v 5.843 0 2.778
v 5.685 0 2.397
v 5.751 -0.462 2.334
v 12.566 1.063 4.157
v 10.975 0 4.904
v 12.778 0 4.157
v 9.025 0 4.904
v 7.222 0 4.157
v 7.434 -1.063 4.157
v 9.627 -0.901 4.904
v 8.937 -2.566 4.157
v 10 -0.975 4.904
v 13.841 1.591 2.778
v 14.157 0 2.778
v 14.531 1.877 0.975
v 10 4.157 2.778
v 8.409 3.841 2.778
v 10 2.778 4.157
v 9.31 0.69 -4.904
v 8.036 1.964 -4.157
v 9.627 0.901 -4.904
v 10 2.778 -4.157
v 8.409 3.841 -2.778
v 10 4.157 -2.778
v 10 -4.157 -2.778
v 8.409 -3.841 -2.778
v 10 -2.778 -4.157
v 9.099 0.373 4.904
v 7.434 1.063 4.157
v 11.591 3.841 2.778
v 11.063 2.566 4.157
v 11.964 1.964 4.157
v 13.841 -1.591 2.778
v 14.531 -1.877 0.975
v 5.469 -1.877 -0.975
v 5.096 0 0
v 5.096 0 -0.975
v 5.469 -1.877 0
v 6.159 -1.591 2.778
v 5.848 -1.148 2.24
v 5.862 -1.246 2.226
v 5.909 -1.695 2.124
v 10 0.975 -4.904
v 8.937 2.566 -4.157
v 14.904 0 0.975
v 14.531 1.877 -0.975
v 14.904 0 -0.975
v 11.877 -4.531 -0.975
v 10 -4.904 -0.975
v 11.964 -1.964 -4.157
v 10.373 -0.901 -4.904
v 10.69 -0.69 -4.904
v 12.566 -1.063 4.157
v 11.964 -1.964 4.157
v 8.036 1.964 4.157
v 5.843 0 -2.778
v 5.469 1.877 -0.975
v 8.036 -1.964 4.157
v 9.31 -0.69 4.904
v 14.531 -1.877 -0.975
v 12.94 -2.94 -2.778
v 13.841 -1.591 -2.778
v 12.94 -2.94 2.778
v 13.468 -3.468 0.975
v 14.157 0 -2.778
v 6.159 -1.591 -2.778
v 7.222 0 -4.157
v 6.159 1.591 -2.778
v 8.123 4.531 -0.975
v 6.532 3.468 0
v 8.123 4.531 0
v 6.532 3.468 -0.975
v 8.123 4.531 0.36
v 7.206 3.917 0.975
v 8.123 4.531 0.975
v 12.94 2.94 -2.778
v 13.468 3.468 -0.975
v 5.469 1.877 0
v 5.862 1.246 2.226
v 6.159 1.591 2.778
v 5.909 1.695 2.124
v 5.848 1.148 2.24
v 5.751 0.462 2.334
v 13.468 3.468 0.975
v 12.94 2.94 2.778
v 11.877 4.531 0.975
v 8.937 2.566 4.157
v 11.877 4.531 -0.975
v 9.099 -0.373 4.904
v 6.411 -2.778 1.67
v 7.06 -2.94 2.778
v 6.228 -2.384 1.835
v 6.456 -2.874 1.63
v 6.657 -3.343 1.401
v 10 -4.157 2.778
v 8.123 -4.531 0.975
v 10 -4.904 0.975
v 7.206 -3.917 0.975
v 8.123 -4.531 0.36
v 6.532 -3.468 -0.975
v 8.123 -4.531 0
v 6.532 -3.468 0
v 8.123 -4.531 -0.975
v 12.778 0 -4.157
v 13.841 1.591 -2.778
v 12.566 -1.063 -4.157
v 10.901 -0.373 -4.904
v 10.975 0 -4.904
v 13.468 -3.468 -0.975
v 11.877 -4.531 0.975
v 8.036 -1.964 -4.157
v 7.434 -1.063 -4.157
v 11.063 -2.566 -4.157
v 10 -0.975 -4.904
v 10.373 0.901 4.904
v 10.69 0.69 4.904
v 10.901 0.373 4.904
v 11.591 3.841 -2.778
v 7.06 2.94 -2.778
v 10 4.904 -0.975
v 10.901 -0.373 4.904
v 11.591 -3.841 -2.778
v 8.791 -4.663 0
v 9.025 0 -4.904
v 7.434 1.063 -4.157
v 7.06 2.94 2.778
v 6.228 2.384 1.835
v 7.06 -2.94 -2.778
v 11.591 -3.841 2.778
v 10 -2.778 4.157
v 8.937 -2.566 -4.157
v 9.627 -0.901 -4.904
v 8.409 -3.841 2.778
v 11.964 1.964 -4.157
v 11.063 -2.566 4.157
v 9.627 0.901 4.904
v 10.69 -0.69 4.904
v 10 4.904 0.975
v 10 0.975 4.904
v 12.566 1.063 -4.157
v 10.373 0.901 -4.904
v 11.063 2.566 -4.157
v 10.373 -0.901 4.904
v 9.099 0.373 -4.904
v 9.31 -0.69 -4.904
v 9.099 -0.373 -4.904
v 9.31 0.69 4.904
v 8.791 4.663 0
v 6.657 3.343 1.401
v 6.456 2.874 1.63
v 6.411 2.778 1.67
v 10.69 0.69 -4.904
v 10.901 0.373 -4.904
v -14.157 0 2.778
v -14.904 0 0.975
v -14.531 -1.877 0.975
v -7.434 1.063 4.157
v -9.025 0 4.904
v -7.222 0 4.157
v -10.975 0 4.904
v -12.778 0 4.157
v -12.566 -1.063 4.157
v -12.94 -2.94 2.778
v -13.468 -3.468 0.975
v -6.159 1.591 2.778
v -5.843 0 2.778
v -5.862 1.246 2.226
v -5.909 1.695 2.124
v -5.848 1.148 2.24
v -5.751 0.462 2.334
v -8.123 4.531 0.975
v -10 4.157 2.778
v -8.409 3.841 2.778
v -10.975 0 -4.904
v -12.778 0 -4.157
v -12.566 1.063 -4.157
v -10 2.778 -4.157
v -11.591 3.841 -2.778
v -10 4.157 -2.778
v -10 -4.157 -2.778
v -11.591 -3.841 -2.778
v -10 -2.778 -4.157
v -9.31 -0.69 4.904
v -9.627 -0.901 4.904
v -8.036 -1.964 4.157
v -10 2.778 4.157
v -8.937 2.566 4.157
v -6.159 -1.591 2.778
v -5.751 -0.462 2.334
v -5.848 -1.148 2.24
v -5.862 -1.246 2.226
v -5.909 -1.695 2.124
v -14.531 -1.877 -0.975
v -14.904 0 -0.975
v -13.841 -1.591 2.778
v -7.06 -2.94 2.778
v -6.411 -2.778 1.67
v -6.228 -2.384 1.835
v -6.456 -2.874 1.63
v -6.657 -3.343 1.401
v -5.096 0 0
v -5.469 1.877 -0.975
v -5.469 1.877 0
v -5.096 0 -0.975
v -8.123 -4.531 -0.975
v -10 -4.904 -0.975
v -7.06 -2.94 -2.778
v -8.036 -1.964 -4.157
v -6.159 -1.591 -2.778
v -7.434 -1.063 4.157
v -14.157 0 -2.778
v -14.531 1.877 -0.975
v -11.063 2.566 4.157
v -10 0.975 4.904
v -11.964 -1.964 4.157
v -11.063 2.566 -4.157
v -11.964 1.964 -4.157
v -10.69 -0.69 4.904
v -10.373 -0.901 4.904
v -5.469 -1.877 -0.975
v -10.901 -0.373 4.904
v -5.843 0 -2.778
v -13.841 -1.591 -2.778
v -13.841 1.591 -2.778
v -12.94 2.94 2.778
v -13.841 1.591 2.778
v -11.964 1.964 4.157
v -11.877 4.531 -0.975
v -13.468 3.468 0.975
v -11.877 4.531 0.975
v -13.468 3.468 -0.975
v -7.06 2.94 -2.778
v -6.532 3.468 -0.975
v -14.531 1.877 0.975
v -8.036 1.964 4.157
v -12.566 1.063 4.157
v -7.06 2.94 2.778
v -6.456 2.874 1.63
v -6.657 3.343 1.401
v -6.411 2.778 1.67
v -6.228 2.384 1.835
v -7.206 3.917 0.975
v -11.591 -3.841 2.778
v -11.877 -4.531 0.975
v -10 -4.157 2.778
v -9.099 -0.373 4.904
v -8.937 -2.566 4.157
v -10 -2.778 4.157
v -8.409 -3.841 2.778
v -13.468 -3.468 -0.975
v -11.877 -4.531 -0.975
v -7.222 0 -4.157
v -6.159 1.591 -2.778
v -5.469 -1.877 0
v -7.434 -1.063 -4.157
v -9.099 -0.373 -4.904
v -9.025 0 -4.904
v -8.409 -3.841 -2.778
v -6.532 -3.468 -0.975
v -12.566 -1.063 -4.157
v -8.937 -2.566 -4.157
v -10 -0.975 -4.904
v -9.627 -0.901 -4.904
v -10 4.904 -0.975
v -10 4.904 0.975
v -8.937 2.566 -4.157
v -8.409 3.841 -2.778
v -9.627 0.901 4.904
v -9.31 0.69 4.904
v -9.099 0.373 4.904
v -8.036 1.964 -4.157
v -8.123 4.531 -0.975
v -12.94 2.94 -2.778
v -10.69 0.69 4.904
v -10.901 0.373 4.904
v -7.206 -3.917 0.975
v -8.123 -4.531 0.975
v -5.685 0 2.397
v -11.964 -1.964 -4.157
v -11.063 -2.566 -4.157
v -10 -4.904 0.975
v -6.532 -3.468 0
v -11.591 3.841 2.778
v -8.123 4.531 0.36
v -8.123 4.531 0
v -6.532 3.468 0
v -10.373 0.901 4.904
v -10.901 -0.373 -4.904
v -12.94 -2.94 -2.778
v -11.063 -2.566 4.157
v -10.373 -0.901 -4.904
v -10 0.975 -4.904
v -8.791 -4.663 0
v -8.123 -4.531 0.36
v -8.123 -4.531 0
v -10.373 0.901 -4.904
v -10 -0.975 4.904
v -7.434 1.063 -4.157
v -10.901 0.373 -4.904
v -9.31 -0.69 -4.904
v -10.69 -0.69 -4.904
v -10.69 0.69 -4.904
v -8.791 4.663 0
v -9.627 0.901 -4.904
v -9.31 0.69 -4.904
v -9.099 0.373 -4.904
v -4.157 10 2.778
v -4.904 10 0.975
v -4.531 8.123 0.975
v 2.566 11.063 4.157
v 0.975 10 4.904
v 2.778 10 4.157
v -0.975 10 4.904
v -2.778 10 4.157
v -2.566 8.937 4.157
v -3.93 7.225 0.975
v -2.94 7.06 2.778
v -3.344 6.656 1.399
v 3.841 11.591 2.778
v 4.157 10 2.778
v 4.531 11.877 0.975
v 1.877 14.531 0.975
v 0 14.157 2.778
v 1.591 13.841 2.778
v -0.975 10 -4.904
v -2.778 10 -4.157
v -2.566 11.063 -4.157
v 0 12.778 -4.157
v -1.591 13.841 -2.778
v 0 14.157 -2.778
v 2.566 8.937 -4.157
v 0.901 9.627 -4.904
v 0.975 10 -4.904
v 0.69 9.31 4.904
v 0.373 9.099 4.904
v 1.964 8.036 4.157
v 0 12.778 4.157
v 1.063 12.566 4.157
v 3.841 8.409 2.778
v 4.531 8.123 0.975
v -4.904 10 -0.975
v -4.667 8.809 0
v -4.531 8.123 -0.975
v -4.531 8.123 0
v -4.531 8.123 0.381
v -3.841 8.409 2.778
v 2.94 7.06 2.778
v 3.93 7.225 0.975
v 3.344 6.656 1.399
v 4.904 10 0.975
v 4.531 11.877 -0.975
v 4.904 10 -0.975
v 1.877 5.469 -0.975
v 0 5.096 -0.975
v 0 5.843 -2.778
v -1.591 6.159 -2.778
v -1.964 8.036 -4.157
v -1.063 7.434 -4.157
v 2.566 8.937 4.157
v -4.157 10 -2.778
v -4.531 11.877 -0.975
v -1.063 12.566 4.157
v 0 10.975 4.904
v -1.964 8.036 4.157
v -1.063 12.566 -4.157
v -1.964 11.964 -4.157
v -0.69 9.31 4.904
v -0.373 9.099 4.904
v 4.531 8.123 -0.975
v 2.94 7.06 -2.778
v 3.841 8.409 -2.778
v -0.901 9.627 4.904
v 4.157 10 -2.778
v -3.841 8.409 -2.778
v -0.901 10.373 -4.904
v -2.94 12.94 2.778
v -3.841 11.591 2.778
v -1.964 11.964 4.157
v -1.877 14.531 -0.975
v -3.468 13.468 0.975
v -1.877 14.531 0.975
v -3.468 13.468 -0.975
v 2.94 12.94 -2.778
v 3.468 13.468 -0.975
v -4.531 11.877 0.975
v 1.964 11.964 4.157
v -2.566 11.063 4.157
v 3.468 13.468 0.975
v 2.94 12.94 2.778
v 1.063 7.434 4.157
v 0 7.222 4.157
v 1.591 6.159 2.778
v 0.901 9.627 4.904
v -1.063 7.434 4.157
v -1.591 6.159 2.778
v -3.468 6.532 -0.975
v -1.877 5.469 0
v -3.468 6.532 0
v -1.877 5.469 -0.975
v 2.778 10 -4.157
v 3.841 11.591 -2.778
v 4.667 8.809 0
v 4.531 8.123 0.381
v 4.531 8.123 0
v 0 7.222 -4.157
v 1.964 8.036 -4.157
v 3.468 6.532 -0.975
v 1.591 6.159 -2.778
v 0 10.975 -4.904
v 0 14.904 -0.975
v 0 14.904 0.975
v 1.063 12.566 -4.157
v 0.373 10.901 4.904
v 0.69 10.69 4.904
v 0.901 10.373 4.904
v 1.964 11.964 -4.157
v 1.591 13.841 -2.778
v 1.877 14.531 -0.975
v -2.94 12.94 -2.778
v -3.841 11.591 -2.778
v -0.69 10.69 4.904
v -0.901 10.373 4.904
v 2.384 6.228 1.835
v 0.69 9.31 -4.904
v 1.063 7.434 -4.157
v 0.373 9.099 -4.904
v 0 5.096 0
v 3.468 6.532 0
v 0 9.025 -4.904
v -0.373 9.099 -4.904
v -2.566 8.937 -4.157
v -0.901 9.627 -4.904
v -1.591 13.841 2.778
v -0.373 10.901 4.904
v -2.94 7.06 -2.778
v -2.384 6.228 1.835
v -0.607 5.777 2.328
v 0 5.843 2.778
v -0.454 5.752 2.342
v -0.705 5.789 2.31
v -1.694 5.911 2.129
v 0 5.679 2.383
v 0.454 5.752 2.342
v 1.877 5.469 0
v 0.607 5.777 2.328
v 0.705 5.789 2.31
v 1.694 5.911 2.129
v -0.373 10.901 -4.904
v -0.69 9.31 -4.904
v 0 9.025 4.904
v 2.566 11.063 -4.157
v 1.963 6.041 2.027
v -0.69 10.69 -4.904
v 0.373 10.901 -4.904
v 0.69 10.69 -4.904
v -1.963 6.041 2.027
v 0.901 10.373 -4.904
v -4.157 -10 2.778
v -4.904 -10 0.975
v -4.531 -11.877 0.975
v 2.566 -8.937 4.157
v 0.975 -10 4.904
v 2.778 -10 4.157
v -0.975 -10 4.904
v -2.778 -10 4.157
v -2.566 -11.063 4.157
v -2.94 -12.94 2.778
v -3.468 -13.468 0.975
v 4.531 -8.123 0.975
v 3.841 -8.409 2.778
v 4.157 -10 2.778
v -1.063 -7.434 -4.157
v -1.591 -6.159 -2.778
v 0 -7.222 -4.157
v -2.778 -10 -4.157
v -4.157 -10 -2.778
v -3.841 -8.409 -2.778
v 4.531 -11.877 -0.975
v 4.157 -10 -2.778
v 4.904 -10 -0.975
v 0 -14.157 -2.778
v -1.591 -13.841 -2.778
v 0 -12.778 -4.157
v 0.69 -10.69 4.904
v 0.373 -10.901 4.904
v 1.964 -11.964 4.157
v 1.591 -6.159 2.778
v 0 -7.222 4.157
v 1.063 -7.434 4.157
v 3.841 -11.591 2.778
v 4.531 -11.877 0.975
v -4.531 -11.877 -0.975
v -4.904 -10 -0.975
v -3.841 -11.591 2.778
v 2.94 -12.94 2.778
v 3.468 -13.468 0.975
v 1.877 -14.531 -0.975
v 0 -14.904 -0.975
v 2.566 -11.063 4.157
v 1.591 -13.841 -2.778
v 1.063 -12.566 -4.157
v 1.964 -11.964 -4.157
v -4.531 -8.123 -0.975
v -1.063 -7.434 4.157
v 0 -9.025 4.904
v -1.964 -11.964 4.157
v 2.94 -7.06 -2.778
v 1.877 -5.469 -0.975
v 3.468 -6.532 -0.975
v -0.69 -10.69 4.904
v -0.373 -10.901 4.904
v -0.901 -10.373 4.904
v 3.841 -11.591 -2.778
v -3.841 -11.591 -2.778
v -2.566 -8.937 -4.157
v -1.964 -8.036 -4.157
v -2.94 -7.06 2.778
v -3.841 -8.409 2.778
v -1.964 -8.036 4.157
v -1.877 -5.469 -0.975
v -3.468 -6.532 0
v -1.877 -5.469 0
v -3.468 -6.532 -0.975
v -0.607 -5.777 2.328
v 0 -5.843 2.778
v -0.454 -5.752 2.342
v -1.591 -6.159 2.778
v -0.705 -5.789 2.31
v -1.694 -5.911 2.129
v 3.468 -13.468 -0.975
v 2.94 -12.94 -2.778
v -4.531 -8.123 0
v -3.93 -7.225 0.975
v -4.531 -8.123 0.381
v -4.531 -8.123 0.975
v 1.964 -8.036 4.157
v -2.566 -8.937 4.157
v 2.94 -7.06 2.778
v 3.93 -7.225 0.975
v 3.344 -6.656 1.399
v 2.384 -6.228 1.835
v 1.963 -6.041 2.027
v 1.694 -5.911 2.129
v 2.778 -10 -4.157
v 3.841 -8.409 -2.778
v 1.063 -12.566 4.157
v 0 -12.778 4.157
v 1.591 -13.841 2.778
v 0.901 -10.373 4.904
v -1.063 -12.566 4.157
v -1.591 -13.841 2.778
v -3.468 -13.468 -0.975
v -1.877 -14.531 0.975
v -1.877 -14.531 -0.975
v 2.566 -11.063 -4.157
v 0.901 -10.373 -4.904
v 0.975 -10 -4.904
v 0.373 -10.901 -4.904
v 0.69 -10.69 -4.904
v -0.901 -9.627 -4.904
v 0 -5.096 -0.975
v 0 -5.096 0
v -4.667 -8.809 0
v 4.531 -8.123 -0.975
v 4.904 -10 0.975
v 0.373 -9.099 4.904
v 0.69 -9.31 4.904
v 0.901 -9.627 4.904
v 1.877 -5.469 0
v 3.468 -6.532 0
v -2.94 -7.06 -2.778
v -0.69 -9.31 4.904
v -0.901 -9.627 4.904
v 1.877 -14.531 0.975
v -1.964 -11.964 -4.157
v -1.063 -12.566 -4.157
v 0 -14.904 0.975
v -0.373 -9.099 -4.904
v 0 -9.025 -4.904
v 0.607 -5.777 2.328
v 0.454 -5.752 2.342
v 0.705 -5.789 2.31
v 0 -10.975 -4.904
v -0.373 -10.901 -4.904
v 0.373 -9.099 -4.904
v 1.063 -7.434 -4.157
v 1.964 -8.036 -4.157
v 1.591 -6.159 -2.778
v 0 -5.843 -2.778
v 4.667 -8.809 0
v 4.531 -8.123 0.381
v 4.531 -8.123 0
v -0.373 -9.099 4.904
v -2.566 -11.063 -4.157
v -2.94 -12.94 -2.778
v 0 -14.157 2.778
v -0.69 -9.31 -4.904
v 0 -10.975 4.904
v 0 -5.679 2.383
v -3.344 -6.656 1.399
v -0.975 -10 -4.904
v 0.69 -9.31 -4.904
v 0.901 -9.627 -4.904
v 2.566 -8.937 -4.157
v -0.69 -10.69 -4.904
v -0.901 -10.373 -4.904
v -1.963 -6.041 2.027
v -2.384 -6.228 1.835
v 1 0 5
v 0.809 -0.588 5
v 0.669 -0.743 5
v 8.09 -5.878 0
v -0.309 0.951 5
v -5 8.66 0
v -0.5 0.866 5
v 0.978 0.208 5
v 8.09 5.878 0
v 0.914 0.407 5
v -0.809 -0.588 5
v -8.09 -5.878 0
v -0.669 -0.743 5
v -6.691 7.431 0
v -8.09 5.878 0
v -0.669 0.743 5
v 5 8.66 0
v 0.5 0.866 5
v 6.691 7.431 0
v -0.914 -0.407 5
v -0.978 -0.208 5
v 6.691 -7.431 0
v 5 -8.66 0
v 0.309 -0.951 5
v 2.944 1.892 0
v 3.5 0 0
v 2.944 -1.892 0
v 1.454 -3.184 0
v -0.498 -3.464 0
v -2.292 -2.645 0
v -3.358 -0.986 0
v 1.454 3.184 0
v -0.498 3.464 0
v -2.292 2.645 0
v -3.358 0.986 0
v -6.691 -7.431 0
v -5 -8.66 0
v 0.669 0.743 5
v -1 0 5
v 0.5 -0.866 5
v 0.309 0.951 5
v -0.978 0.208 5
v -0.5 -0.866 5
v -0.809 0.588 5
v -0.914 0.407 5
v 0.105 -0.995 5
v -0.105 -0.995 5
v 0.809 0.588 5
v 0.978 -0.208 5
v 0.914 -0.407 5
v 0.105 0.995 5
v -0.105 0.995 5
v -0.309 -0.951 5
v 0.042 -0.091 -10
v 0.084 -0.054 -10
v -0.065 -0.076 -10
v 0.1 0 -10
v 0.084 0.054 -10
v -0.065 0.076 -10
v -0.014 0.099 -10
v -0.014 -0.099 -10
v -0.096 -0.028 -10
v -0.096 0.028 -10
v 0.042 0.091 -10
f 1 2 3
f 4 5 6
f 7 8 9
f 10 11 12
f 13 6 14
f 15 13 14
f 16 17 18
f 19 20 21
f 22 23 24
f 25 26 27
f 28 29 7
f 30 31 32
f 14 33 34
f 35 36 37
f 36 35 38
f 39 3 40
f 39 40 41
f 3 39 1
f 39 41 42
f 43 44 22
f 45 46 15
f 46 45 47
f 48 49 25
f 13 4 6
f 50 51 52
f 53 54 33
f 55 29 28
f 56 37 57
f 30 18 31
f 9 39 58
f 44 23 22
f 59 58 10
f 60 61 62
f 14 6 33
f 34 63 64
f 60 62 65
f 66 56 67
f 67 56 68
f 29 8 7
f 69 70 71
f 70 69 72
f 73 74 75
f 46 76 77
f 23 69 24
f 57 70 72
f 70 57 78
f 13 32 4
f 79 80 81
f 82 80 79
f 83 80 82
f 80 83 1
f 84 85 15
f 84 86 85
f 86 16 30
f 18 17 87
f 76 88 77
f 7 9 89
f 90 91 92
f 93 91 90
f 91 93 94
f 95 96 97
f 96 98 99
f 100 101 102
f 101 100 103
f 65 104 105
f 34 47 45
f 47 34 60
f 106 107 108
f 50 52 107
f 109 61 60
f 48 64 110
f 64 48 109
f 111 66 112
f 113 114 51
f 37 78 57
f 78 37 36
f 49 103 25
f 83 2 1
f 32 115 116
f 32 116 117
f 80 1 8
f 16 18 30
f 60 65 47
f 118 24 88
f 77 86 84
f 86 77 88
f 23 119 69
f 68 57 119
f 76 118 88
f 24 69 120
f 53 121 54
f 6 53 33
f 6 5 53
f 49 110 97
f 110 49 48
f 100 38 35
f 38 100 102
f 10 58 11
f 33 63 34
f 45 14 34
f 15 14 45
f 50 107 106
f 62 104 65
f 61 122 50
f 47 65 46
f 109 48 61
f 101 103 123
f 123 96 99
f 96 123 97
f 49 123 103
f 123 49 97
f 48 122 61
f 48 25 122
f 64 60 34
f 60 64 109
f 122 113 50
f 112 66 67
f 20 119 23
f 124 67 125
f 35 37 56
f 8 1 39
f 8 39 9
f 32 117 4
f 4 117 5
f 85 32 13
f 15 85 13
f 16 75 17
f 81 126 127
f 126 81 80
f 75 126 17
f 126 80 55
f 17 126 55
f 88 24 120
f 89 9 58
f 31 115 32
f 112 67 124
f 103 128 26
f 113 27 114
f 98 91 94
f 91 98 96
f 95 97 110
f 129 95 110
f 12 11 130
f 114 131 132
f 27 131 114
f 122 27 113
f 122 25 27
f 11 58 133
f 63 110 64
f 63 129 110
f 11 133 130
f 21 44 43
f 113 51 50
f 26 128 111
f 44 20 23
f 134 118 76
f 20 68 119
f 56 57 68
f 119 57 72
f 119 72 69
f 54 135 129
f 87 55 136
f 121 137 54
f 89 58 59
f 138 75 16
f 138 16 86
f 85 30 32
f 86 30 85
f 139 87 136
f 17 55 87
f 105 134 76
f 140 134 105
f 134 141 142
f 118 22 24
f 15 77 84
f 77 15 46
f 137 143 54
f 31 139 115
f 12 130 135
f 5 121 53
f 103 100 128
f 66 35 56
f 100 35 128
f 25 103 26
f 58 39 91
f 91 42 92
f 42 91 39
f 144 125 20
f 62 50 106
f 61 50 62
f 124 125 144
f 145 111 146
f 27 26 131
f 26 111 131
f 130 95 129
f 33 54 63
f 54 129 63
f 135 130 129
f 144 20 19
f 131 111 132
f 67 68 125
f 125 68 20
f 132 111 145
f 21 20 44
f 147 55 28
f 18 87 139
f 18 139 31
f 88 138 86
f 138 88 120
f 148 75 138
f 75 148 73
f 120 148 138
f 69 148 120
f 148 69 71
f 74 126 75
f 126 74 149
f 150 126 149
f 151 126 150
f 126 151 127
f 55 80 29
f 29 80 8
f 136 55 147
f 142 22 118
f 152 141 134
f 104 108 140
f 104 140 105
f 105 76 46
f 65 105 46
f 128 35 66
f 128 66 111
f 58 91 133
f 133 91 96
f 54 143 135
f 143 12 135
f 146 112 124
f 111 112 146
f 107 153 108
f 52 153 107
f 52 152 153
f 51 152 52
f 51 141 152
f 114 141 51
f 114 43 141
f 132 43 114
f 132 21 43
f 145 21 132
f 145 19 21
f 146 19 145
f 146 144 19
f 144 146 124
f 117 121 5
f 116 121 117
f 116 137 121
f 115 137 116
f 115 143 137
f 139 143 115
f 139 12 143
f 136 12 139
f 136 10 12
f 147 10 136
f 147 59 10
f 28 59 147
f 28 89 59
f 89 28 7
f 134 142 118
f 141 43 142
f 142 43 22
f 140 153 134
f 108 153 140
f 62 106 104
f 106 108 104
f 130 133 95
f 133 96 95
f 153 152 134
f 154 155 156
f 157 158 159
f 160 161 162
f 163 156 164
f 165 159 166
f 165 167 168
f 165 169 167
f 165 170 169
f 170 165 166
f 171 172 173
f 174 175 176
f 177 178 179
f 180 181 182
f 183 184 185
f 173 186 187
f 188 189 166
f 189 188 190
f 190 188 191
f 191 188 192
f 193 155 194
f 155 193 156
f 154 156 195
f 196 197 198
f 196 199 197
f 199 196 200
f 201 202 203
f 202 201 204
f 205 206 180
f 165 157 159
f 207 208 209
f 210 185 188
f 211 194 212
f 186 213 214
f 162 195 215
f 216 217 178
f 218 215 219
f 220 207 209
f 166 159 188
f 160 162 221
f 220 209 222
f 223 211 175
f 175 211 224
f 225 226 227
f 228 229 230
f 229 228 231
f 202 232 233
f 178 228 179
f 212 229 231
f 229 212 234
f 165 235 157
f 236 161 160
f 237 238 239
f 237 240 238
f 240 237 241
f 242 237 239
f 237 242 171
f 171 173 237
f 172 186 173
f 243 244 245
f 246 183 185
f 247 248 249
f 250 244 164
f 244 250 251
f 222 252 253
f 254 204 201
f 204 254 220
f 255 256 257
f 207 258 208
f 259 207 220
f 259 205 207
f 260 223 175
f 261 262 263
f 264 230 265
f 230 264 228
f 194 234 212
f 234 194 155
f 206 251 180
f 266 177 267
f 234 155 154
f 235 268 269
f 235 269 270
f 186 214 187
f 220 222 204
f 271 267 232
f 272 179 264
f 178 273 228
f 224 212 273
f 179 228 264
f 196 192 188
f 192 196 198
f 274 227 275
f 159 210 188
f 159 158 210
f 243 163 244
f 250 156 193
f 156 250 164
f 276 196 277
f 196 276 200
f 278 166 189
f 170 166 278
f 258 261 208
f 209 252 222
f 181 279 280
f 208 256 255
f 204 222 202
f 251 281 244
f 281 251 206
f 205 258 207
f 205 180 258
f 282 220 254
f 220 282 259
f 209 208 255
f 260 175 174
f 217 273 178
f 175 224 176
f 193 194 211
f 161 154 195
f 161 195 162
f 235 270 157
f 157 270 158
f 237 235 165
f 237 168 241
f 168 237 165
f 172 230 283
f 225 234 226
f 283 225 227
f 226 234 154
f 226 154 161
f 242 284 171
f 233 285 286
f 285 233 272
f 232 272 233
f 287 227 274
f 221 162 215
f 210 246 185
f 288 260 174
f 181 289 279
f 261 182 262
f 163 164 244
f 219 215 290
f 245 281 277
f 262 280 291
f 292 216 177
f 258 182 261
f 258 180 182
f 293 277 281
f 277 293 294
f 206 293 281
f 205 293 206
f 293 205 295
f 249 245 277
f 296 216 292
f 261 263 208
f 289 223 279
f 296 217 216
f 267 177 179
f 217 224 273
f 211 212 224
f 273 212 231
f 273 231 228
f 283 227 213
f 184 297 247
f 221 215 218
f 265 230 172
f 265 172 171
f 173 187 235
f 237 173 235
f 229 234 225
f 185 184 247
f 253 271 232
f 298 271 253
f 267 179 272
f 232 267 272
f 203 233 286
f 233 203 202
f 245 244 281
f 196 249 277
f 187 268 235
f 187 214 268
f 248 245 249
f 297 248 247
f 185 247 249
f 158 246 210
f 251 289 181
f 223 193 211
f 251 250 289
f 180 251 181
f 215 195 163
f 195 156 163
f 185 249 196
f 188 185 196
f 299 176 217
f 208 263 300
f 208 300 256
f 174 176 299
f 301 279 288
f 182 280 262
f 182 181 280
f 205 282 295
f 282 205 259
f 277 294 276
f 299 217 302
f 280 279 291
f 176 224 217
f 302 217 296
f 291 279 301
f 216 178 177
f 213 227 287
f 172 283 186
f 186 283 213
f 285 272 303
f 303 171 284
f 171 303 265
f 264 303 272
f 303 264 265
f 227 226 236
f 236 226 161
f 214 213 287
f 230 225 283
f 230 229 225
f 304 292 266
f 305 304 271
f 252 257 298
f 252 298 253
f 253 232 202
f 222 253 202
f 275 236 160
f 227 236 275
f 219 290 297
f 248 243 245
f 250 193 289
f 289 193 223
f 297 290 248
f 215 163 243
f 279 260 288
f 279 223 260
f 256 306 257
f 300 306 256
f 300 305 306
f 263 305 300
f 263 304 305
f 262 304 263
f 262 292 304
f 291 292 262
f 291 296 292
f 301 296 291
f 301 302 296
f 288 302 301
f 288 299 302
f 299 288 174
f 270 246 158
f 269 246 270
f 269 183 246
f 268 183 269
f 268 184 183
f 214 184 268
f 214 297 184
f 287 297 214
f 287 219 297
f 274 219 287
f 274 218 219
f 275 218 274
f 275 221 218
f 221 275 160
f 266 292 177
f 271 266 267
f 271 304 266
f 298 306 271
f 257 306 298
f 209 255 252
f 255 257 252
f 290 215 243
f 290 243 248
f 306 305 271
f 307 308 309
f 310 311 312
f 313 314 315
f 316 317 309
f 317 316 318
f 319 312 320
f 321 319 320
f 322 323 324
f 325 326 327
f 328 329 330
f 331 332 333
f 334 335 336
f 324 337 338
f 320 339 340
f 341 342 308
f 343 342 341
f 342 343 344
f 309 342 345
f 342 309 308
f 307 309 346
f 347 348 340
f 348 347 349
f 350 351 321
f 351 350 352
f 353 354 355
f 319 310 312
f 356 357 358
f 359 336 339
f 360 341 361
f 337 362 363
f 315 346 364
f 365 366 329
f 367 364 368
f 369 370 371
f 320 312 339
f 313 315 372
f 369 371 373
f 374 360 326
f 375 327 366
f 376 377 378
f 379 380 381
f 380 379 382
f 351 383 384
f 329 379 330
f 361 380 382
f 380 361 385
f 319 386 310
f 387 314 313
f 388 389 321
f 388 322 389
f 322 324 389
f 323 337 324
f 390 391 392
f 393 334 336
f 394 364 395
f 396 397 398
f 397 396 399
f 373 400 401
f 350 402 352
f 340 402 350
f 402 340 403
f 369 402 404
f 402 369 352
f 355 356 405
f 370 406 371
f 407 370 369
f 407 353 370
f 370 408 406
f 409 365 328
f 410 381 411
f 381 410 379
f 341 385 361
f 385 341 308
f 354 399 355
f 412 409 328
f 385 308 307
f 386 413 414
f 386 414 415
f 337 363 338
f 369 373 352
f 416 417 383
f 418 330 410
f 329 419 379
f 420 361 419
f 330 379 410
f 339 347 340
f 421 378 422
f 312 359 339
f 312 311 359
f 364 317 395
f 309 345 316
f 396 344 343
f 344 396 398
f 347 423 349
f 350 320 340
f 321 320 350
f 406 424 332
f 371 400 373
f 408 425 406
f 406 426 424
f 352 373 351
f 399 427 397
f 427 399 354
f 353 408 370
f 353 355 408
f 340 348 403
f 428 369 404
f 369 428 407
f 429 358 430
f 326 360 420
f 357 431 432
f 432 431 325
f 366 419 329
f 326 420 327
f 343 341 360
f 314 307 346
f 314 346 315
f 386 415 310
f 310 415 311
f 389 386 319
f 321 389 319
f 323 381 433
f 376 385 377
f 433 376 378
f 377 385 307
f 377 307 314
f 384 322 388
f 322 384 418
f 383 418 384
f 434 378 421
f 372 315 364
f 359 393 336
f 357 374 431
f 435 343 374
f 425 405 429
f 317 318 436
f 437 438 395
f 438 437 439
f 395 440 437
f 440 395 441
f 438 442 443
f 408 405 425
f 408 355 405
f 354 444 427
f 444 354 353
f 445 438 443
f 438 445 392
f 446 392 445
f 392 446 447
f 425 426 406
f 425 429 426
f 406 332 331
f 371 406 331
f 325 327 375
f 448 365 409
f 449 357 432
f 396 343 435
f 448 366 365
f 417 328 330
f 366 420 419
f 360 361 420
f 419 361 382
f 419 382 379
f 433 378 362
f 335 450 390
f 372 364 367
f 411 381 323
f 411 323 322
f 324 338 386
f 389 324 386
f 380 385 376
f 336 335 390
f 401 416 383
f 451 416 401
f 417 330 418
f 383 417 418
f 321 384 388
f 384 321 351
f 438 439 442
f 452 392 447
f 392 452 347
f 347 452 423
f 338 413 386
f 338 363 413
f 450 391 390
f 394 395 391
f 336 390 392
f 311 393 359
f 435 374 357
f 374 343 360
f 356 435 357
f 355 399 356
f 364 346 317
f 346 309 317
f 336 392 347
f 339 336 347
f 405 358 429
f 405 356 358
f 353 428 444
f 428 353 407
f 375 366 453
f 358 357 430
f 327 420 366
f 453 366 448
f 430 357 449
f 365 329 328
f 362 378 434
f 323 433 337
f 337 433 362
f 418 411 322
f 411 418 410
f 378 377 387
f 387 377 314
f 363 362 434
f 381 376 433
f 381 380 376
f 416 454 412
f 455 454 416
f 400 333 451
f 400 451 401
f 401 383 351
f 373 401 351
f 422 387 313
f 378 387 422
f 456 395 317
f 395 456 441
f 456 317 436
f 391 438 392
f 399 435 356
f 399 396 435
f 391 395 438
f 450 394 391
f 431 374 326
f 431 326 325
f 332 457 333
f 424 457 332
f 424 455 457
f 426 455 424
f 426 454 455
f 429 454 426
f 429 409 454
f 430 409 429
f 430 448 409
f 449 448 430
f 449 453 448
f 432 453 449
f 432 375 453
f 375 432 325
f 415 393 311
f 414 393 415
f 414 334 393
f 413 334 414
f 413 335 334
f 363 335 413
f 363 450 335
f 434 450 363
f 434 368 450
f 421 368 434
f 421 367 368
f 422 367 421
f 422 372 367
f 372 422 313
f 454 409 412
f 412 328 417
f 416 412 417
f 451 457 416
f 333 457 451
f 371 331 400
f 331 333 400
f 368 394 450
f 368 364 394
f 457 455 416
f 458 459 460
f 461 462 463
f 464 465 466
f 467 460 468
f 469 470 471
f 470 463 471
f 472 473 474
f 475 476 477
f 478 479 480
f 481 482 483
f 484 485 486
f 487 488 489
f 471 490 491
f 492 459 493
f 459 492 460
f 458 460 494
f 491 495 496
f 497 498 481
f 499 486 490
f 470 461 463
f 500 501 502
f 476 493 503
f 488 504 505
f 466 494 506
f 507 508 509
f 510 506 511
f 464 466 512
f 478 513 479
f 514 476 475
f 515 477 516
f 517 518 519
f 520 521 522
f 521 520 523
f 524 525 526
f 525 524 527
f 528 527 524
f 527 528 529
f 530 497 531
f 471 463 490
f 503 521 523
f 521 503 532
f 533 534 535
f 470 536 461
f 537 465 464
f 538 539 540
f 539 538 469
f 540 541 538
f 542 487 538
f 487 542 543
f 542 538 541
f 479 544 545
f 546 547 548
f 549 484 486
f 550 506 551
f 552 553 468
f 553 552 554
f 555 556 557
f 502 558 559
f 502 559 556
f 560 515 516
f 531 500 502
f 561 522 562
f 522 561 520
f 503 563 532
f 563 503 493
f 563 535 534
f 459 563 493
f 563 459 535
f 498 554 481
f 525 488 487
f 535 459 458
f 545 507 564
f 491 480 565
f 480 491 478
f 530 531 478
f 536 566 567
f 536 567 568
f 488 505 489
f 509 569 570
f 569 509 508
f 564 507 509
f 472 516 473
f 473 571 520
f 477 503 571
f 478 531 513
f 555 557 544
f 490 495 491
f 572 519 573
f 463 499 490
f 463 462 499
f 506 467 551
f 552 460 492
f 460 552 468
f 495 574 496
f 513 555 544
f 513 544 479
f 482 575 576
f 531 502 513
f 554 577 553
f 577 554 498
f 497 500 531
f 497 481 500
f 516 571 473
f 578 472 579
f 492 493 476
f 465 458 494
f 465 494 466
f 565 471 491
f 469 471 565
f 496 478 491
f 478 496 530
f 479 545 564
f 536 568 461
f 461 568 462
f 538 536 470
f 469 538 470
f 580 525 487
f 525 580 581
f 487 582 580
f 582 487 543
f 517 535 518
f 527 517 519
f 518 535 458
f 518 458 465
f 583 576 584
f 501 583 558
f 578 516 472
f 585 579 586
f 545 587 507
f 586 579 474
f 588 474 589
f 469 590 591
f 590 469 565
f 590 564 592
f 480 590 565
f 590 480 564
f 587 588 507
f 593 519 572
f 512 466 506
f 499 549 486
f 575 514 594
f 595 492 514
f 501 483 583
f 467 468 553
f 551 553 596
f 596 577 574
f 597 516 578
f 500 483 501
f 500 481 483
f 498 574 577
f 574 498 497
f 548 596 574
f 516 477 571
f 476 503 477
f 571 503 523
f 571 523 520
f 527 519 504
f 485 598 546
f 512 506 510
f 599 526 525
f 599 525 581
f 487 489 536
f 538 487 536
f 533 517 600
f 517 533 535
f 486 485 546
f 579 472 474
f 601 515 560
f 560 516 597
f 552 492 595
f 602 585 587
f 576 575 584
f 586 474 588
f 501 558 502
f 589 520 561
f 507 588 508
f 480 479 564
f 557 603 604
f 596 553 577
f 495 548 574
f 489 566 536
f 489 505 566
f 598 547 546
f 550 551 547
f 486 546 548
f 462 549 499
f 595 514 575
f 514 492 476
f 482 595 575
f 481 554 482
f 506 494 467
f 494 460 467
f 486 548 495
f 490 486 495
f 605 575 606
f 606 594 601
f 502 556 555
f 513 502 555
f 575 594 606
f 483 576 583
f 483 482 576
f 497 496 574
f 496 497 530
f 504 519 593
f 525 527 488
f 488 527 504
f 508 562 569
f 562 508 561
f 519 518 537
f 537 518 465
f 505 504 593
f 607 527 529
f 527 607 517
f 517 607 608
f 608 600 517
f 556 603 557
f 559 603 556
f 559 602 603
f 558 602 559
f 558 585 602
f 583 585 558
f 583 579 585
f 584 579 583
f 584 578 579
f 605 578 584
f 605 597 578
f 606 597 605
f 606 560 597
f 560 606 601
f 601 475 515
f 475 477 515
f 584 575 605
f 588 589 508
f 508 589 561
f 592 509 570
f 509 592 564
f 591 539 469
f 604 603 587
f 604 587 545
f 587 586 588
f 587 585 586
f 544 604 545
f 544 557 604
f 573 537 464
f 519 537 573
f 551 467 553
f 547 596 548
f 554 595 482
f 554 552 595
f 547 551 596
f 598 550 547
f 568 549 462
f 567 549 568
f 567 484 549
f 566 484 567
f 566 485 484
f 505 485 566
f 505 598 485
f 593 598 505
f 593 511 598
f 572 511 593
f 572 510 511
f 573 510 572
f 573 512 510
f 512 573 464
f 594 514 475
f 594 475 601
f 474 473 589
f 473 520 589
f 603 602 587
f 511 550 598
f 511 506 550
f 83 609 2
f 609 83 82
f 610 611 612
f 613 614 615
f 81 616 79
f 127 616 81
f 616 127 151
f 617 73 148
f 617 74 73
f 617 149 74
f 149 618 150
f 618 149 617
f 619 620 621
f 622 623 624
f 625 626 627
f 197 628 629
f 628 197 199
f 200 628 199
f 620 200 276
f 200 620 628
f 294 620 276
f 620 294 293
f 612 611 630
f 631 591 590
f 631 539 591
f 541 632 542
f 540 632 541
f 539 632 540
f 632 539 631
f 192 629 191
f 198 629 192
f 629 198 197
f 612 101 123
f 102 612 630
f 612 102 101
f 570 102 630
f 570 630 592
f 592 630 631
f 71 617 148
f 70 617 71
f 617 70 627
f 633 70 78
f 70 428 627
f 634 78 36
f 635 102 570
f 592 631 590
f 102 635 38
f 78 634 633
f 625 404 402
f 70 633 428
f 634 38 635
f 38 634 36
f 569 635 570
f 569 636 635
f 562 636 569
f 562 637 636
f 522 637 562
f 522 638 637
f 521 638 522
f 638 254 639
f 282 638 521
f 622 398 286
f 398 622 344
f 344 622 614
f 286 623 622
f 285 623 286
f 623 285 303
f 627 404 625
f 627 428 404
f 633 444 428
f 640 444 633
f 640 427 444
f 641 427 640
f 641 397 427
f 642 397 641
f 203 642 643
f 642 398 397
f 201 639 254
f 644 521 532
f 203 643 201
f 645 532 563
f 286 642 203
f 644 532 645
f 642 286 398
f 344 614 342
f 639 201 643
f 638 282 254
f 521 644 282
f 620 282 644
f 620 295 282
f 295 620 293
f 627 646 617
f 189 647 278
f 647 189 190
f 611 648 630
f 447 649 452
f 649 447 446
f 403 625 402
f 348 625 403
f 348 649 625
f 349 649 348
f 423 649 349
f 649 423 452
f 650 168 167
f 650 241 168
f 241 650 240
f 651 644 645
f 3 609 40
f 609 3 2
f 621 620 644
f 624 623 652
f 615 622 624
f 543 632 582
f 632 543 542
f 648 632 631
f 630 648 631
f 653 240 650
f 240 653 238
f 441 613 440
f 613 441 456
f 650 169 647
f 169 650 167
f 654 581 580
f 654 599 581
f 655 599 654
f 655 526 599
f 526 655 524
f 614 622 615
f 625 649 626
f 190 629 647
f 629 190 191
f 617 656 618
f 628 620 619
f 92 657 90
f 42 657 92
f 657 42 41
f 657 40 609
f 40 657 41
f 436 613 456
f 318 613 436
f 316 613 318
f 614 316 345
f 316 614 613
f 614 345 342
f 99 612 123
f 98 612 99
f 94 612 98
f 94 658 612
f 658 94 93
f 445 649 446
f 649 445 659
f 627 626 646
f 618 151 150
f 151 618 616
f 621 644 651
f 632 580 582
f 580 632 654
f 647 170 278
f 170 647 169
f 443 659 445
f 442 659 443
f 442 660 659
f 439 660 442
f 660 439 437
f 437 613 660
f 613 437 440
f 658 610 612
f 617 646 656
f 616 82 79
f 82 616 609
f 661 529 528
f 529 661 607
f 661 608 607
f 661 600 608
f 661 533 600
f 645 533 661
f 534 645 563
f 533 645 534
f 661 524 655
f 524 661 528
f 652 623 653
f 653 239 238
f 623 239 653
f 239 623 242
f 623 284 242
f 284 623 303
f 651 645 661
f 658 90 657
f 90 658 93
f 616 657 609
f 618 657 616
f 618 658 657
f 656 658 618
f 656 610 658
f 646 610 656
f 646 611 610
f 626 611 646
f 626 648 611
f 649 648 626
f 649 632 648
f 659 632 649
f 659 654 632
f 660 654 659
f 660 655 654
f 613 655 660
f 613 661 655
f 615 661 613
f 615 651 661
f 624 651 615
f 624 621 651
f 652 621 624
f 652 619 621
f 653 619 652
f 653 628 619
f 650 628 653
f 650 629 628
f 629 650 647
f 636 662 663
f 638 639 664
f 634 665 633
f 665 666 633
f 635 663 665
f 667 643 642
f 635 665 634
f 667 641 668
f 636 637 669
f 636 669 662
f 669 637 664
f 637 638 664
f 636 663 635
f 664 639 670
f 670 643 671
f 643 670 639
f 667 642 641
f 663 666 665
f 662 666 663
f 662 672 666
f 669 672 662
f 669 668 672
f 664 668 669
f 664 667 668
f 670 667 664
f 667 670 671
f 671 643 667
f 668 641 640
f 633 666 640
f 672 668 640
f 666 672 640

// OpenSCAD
translate([10,0,0])sphere(5);
translate([-10,0,0])sphere(5);
translate([0,10,0])sphere(5);
translate([0,-10,0])sphere(5);
cylinder(5,10);
//top spike
translate([0,0,-10]) cylinder(10,.1,3.5);
